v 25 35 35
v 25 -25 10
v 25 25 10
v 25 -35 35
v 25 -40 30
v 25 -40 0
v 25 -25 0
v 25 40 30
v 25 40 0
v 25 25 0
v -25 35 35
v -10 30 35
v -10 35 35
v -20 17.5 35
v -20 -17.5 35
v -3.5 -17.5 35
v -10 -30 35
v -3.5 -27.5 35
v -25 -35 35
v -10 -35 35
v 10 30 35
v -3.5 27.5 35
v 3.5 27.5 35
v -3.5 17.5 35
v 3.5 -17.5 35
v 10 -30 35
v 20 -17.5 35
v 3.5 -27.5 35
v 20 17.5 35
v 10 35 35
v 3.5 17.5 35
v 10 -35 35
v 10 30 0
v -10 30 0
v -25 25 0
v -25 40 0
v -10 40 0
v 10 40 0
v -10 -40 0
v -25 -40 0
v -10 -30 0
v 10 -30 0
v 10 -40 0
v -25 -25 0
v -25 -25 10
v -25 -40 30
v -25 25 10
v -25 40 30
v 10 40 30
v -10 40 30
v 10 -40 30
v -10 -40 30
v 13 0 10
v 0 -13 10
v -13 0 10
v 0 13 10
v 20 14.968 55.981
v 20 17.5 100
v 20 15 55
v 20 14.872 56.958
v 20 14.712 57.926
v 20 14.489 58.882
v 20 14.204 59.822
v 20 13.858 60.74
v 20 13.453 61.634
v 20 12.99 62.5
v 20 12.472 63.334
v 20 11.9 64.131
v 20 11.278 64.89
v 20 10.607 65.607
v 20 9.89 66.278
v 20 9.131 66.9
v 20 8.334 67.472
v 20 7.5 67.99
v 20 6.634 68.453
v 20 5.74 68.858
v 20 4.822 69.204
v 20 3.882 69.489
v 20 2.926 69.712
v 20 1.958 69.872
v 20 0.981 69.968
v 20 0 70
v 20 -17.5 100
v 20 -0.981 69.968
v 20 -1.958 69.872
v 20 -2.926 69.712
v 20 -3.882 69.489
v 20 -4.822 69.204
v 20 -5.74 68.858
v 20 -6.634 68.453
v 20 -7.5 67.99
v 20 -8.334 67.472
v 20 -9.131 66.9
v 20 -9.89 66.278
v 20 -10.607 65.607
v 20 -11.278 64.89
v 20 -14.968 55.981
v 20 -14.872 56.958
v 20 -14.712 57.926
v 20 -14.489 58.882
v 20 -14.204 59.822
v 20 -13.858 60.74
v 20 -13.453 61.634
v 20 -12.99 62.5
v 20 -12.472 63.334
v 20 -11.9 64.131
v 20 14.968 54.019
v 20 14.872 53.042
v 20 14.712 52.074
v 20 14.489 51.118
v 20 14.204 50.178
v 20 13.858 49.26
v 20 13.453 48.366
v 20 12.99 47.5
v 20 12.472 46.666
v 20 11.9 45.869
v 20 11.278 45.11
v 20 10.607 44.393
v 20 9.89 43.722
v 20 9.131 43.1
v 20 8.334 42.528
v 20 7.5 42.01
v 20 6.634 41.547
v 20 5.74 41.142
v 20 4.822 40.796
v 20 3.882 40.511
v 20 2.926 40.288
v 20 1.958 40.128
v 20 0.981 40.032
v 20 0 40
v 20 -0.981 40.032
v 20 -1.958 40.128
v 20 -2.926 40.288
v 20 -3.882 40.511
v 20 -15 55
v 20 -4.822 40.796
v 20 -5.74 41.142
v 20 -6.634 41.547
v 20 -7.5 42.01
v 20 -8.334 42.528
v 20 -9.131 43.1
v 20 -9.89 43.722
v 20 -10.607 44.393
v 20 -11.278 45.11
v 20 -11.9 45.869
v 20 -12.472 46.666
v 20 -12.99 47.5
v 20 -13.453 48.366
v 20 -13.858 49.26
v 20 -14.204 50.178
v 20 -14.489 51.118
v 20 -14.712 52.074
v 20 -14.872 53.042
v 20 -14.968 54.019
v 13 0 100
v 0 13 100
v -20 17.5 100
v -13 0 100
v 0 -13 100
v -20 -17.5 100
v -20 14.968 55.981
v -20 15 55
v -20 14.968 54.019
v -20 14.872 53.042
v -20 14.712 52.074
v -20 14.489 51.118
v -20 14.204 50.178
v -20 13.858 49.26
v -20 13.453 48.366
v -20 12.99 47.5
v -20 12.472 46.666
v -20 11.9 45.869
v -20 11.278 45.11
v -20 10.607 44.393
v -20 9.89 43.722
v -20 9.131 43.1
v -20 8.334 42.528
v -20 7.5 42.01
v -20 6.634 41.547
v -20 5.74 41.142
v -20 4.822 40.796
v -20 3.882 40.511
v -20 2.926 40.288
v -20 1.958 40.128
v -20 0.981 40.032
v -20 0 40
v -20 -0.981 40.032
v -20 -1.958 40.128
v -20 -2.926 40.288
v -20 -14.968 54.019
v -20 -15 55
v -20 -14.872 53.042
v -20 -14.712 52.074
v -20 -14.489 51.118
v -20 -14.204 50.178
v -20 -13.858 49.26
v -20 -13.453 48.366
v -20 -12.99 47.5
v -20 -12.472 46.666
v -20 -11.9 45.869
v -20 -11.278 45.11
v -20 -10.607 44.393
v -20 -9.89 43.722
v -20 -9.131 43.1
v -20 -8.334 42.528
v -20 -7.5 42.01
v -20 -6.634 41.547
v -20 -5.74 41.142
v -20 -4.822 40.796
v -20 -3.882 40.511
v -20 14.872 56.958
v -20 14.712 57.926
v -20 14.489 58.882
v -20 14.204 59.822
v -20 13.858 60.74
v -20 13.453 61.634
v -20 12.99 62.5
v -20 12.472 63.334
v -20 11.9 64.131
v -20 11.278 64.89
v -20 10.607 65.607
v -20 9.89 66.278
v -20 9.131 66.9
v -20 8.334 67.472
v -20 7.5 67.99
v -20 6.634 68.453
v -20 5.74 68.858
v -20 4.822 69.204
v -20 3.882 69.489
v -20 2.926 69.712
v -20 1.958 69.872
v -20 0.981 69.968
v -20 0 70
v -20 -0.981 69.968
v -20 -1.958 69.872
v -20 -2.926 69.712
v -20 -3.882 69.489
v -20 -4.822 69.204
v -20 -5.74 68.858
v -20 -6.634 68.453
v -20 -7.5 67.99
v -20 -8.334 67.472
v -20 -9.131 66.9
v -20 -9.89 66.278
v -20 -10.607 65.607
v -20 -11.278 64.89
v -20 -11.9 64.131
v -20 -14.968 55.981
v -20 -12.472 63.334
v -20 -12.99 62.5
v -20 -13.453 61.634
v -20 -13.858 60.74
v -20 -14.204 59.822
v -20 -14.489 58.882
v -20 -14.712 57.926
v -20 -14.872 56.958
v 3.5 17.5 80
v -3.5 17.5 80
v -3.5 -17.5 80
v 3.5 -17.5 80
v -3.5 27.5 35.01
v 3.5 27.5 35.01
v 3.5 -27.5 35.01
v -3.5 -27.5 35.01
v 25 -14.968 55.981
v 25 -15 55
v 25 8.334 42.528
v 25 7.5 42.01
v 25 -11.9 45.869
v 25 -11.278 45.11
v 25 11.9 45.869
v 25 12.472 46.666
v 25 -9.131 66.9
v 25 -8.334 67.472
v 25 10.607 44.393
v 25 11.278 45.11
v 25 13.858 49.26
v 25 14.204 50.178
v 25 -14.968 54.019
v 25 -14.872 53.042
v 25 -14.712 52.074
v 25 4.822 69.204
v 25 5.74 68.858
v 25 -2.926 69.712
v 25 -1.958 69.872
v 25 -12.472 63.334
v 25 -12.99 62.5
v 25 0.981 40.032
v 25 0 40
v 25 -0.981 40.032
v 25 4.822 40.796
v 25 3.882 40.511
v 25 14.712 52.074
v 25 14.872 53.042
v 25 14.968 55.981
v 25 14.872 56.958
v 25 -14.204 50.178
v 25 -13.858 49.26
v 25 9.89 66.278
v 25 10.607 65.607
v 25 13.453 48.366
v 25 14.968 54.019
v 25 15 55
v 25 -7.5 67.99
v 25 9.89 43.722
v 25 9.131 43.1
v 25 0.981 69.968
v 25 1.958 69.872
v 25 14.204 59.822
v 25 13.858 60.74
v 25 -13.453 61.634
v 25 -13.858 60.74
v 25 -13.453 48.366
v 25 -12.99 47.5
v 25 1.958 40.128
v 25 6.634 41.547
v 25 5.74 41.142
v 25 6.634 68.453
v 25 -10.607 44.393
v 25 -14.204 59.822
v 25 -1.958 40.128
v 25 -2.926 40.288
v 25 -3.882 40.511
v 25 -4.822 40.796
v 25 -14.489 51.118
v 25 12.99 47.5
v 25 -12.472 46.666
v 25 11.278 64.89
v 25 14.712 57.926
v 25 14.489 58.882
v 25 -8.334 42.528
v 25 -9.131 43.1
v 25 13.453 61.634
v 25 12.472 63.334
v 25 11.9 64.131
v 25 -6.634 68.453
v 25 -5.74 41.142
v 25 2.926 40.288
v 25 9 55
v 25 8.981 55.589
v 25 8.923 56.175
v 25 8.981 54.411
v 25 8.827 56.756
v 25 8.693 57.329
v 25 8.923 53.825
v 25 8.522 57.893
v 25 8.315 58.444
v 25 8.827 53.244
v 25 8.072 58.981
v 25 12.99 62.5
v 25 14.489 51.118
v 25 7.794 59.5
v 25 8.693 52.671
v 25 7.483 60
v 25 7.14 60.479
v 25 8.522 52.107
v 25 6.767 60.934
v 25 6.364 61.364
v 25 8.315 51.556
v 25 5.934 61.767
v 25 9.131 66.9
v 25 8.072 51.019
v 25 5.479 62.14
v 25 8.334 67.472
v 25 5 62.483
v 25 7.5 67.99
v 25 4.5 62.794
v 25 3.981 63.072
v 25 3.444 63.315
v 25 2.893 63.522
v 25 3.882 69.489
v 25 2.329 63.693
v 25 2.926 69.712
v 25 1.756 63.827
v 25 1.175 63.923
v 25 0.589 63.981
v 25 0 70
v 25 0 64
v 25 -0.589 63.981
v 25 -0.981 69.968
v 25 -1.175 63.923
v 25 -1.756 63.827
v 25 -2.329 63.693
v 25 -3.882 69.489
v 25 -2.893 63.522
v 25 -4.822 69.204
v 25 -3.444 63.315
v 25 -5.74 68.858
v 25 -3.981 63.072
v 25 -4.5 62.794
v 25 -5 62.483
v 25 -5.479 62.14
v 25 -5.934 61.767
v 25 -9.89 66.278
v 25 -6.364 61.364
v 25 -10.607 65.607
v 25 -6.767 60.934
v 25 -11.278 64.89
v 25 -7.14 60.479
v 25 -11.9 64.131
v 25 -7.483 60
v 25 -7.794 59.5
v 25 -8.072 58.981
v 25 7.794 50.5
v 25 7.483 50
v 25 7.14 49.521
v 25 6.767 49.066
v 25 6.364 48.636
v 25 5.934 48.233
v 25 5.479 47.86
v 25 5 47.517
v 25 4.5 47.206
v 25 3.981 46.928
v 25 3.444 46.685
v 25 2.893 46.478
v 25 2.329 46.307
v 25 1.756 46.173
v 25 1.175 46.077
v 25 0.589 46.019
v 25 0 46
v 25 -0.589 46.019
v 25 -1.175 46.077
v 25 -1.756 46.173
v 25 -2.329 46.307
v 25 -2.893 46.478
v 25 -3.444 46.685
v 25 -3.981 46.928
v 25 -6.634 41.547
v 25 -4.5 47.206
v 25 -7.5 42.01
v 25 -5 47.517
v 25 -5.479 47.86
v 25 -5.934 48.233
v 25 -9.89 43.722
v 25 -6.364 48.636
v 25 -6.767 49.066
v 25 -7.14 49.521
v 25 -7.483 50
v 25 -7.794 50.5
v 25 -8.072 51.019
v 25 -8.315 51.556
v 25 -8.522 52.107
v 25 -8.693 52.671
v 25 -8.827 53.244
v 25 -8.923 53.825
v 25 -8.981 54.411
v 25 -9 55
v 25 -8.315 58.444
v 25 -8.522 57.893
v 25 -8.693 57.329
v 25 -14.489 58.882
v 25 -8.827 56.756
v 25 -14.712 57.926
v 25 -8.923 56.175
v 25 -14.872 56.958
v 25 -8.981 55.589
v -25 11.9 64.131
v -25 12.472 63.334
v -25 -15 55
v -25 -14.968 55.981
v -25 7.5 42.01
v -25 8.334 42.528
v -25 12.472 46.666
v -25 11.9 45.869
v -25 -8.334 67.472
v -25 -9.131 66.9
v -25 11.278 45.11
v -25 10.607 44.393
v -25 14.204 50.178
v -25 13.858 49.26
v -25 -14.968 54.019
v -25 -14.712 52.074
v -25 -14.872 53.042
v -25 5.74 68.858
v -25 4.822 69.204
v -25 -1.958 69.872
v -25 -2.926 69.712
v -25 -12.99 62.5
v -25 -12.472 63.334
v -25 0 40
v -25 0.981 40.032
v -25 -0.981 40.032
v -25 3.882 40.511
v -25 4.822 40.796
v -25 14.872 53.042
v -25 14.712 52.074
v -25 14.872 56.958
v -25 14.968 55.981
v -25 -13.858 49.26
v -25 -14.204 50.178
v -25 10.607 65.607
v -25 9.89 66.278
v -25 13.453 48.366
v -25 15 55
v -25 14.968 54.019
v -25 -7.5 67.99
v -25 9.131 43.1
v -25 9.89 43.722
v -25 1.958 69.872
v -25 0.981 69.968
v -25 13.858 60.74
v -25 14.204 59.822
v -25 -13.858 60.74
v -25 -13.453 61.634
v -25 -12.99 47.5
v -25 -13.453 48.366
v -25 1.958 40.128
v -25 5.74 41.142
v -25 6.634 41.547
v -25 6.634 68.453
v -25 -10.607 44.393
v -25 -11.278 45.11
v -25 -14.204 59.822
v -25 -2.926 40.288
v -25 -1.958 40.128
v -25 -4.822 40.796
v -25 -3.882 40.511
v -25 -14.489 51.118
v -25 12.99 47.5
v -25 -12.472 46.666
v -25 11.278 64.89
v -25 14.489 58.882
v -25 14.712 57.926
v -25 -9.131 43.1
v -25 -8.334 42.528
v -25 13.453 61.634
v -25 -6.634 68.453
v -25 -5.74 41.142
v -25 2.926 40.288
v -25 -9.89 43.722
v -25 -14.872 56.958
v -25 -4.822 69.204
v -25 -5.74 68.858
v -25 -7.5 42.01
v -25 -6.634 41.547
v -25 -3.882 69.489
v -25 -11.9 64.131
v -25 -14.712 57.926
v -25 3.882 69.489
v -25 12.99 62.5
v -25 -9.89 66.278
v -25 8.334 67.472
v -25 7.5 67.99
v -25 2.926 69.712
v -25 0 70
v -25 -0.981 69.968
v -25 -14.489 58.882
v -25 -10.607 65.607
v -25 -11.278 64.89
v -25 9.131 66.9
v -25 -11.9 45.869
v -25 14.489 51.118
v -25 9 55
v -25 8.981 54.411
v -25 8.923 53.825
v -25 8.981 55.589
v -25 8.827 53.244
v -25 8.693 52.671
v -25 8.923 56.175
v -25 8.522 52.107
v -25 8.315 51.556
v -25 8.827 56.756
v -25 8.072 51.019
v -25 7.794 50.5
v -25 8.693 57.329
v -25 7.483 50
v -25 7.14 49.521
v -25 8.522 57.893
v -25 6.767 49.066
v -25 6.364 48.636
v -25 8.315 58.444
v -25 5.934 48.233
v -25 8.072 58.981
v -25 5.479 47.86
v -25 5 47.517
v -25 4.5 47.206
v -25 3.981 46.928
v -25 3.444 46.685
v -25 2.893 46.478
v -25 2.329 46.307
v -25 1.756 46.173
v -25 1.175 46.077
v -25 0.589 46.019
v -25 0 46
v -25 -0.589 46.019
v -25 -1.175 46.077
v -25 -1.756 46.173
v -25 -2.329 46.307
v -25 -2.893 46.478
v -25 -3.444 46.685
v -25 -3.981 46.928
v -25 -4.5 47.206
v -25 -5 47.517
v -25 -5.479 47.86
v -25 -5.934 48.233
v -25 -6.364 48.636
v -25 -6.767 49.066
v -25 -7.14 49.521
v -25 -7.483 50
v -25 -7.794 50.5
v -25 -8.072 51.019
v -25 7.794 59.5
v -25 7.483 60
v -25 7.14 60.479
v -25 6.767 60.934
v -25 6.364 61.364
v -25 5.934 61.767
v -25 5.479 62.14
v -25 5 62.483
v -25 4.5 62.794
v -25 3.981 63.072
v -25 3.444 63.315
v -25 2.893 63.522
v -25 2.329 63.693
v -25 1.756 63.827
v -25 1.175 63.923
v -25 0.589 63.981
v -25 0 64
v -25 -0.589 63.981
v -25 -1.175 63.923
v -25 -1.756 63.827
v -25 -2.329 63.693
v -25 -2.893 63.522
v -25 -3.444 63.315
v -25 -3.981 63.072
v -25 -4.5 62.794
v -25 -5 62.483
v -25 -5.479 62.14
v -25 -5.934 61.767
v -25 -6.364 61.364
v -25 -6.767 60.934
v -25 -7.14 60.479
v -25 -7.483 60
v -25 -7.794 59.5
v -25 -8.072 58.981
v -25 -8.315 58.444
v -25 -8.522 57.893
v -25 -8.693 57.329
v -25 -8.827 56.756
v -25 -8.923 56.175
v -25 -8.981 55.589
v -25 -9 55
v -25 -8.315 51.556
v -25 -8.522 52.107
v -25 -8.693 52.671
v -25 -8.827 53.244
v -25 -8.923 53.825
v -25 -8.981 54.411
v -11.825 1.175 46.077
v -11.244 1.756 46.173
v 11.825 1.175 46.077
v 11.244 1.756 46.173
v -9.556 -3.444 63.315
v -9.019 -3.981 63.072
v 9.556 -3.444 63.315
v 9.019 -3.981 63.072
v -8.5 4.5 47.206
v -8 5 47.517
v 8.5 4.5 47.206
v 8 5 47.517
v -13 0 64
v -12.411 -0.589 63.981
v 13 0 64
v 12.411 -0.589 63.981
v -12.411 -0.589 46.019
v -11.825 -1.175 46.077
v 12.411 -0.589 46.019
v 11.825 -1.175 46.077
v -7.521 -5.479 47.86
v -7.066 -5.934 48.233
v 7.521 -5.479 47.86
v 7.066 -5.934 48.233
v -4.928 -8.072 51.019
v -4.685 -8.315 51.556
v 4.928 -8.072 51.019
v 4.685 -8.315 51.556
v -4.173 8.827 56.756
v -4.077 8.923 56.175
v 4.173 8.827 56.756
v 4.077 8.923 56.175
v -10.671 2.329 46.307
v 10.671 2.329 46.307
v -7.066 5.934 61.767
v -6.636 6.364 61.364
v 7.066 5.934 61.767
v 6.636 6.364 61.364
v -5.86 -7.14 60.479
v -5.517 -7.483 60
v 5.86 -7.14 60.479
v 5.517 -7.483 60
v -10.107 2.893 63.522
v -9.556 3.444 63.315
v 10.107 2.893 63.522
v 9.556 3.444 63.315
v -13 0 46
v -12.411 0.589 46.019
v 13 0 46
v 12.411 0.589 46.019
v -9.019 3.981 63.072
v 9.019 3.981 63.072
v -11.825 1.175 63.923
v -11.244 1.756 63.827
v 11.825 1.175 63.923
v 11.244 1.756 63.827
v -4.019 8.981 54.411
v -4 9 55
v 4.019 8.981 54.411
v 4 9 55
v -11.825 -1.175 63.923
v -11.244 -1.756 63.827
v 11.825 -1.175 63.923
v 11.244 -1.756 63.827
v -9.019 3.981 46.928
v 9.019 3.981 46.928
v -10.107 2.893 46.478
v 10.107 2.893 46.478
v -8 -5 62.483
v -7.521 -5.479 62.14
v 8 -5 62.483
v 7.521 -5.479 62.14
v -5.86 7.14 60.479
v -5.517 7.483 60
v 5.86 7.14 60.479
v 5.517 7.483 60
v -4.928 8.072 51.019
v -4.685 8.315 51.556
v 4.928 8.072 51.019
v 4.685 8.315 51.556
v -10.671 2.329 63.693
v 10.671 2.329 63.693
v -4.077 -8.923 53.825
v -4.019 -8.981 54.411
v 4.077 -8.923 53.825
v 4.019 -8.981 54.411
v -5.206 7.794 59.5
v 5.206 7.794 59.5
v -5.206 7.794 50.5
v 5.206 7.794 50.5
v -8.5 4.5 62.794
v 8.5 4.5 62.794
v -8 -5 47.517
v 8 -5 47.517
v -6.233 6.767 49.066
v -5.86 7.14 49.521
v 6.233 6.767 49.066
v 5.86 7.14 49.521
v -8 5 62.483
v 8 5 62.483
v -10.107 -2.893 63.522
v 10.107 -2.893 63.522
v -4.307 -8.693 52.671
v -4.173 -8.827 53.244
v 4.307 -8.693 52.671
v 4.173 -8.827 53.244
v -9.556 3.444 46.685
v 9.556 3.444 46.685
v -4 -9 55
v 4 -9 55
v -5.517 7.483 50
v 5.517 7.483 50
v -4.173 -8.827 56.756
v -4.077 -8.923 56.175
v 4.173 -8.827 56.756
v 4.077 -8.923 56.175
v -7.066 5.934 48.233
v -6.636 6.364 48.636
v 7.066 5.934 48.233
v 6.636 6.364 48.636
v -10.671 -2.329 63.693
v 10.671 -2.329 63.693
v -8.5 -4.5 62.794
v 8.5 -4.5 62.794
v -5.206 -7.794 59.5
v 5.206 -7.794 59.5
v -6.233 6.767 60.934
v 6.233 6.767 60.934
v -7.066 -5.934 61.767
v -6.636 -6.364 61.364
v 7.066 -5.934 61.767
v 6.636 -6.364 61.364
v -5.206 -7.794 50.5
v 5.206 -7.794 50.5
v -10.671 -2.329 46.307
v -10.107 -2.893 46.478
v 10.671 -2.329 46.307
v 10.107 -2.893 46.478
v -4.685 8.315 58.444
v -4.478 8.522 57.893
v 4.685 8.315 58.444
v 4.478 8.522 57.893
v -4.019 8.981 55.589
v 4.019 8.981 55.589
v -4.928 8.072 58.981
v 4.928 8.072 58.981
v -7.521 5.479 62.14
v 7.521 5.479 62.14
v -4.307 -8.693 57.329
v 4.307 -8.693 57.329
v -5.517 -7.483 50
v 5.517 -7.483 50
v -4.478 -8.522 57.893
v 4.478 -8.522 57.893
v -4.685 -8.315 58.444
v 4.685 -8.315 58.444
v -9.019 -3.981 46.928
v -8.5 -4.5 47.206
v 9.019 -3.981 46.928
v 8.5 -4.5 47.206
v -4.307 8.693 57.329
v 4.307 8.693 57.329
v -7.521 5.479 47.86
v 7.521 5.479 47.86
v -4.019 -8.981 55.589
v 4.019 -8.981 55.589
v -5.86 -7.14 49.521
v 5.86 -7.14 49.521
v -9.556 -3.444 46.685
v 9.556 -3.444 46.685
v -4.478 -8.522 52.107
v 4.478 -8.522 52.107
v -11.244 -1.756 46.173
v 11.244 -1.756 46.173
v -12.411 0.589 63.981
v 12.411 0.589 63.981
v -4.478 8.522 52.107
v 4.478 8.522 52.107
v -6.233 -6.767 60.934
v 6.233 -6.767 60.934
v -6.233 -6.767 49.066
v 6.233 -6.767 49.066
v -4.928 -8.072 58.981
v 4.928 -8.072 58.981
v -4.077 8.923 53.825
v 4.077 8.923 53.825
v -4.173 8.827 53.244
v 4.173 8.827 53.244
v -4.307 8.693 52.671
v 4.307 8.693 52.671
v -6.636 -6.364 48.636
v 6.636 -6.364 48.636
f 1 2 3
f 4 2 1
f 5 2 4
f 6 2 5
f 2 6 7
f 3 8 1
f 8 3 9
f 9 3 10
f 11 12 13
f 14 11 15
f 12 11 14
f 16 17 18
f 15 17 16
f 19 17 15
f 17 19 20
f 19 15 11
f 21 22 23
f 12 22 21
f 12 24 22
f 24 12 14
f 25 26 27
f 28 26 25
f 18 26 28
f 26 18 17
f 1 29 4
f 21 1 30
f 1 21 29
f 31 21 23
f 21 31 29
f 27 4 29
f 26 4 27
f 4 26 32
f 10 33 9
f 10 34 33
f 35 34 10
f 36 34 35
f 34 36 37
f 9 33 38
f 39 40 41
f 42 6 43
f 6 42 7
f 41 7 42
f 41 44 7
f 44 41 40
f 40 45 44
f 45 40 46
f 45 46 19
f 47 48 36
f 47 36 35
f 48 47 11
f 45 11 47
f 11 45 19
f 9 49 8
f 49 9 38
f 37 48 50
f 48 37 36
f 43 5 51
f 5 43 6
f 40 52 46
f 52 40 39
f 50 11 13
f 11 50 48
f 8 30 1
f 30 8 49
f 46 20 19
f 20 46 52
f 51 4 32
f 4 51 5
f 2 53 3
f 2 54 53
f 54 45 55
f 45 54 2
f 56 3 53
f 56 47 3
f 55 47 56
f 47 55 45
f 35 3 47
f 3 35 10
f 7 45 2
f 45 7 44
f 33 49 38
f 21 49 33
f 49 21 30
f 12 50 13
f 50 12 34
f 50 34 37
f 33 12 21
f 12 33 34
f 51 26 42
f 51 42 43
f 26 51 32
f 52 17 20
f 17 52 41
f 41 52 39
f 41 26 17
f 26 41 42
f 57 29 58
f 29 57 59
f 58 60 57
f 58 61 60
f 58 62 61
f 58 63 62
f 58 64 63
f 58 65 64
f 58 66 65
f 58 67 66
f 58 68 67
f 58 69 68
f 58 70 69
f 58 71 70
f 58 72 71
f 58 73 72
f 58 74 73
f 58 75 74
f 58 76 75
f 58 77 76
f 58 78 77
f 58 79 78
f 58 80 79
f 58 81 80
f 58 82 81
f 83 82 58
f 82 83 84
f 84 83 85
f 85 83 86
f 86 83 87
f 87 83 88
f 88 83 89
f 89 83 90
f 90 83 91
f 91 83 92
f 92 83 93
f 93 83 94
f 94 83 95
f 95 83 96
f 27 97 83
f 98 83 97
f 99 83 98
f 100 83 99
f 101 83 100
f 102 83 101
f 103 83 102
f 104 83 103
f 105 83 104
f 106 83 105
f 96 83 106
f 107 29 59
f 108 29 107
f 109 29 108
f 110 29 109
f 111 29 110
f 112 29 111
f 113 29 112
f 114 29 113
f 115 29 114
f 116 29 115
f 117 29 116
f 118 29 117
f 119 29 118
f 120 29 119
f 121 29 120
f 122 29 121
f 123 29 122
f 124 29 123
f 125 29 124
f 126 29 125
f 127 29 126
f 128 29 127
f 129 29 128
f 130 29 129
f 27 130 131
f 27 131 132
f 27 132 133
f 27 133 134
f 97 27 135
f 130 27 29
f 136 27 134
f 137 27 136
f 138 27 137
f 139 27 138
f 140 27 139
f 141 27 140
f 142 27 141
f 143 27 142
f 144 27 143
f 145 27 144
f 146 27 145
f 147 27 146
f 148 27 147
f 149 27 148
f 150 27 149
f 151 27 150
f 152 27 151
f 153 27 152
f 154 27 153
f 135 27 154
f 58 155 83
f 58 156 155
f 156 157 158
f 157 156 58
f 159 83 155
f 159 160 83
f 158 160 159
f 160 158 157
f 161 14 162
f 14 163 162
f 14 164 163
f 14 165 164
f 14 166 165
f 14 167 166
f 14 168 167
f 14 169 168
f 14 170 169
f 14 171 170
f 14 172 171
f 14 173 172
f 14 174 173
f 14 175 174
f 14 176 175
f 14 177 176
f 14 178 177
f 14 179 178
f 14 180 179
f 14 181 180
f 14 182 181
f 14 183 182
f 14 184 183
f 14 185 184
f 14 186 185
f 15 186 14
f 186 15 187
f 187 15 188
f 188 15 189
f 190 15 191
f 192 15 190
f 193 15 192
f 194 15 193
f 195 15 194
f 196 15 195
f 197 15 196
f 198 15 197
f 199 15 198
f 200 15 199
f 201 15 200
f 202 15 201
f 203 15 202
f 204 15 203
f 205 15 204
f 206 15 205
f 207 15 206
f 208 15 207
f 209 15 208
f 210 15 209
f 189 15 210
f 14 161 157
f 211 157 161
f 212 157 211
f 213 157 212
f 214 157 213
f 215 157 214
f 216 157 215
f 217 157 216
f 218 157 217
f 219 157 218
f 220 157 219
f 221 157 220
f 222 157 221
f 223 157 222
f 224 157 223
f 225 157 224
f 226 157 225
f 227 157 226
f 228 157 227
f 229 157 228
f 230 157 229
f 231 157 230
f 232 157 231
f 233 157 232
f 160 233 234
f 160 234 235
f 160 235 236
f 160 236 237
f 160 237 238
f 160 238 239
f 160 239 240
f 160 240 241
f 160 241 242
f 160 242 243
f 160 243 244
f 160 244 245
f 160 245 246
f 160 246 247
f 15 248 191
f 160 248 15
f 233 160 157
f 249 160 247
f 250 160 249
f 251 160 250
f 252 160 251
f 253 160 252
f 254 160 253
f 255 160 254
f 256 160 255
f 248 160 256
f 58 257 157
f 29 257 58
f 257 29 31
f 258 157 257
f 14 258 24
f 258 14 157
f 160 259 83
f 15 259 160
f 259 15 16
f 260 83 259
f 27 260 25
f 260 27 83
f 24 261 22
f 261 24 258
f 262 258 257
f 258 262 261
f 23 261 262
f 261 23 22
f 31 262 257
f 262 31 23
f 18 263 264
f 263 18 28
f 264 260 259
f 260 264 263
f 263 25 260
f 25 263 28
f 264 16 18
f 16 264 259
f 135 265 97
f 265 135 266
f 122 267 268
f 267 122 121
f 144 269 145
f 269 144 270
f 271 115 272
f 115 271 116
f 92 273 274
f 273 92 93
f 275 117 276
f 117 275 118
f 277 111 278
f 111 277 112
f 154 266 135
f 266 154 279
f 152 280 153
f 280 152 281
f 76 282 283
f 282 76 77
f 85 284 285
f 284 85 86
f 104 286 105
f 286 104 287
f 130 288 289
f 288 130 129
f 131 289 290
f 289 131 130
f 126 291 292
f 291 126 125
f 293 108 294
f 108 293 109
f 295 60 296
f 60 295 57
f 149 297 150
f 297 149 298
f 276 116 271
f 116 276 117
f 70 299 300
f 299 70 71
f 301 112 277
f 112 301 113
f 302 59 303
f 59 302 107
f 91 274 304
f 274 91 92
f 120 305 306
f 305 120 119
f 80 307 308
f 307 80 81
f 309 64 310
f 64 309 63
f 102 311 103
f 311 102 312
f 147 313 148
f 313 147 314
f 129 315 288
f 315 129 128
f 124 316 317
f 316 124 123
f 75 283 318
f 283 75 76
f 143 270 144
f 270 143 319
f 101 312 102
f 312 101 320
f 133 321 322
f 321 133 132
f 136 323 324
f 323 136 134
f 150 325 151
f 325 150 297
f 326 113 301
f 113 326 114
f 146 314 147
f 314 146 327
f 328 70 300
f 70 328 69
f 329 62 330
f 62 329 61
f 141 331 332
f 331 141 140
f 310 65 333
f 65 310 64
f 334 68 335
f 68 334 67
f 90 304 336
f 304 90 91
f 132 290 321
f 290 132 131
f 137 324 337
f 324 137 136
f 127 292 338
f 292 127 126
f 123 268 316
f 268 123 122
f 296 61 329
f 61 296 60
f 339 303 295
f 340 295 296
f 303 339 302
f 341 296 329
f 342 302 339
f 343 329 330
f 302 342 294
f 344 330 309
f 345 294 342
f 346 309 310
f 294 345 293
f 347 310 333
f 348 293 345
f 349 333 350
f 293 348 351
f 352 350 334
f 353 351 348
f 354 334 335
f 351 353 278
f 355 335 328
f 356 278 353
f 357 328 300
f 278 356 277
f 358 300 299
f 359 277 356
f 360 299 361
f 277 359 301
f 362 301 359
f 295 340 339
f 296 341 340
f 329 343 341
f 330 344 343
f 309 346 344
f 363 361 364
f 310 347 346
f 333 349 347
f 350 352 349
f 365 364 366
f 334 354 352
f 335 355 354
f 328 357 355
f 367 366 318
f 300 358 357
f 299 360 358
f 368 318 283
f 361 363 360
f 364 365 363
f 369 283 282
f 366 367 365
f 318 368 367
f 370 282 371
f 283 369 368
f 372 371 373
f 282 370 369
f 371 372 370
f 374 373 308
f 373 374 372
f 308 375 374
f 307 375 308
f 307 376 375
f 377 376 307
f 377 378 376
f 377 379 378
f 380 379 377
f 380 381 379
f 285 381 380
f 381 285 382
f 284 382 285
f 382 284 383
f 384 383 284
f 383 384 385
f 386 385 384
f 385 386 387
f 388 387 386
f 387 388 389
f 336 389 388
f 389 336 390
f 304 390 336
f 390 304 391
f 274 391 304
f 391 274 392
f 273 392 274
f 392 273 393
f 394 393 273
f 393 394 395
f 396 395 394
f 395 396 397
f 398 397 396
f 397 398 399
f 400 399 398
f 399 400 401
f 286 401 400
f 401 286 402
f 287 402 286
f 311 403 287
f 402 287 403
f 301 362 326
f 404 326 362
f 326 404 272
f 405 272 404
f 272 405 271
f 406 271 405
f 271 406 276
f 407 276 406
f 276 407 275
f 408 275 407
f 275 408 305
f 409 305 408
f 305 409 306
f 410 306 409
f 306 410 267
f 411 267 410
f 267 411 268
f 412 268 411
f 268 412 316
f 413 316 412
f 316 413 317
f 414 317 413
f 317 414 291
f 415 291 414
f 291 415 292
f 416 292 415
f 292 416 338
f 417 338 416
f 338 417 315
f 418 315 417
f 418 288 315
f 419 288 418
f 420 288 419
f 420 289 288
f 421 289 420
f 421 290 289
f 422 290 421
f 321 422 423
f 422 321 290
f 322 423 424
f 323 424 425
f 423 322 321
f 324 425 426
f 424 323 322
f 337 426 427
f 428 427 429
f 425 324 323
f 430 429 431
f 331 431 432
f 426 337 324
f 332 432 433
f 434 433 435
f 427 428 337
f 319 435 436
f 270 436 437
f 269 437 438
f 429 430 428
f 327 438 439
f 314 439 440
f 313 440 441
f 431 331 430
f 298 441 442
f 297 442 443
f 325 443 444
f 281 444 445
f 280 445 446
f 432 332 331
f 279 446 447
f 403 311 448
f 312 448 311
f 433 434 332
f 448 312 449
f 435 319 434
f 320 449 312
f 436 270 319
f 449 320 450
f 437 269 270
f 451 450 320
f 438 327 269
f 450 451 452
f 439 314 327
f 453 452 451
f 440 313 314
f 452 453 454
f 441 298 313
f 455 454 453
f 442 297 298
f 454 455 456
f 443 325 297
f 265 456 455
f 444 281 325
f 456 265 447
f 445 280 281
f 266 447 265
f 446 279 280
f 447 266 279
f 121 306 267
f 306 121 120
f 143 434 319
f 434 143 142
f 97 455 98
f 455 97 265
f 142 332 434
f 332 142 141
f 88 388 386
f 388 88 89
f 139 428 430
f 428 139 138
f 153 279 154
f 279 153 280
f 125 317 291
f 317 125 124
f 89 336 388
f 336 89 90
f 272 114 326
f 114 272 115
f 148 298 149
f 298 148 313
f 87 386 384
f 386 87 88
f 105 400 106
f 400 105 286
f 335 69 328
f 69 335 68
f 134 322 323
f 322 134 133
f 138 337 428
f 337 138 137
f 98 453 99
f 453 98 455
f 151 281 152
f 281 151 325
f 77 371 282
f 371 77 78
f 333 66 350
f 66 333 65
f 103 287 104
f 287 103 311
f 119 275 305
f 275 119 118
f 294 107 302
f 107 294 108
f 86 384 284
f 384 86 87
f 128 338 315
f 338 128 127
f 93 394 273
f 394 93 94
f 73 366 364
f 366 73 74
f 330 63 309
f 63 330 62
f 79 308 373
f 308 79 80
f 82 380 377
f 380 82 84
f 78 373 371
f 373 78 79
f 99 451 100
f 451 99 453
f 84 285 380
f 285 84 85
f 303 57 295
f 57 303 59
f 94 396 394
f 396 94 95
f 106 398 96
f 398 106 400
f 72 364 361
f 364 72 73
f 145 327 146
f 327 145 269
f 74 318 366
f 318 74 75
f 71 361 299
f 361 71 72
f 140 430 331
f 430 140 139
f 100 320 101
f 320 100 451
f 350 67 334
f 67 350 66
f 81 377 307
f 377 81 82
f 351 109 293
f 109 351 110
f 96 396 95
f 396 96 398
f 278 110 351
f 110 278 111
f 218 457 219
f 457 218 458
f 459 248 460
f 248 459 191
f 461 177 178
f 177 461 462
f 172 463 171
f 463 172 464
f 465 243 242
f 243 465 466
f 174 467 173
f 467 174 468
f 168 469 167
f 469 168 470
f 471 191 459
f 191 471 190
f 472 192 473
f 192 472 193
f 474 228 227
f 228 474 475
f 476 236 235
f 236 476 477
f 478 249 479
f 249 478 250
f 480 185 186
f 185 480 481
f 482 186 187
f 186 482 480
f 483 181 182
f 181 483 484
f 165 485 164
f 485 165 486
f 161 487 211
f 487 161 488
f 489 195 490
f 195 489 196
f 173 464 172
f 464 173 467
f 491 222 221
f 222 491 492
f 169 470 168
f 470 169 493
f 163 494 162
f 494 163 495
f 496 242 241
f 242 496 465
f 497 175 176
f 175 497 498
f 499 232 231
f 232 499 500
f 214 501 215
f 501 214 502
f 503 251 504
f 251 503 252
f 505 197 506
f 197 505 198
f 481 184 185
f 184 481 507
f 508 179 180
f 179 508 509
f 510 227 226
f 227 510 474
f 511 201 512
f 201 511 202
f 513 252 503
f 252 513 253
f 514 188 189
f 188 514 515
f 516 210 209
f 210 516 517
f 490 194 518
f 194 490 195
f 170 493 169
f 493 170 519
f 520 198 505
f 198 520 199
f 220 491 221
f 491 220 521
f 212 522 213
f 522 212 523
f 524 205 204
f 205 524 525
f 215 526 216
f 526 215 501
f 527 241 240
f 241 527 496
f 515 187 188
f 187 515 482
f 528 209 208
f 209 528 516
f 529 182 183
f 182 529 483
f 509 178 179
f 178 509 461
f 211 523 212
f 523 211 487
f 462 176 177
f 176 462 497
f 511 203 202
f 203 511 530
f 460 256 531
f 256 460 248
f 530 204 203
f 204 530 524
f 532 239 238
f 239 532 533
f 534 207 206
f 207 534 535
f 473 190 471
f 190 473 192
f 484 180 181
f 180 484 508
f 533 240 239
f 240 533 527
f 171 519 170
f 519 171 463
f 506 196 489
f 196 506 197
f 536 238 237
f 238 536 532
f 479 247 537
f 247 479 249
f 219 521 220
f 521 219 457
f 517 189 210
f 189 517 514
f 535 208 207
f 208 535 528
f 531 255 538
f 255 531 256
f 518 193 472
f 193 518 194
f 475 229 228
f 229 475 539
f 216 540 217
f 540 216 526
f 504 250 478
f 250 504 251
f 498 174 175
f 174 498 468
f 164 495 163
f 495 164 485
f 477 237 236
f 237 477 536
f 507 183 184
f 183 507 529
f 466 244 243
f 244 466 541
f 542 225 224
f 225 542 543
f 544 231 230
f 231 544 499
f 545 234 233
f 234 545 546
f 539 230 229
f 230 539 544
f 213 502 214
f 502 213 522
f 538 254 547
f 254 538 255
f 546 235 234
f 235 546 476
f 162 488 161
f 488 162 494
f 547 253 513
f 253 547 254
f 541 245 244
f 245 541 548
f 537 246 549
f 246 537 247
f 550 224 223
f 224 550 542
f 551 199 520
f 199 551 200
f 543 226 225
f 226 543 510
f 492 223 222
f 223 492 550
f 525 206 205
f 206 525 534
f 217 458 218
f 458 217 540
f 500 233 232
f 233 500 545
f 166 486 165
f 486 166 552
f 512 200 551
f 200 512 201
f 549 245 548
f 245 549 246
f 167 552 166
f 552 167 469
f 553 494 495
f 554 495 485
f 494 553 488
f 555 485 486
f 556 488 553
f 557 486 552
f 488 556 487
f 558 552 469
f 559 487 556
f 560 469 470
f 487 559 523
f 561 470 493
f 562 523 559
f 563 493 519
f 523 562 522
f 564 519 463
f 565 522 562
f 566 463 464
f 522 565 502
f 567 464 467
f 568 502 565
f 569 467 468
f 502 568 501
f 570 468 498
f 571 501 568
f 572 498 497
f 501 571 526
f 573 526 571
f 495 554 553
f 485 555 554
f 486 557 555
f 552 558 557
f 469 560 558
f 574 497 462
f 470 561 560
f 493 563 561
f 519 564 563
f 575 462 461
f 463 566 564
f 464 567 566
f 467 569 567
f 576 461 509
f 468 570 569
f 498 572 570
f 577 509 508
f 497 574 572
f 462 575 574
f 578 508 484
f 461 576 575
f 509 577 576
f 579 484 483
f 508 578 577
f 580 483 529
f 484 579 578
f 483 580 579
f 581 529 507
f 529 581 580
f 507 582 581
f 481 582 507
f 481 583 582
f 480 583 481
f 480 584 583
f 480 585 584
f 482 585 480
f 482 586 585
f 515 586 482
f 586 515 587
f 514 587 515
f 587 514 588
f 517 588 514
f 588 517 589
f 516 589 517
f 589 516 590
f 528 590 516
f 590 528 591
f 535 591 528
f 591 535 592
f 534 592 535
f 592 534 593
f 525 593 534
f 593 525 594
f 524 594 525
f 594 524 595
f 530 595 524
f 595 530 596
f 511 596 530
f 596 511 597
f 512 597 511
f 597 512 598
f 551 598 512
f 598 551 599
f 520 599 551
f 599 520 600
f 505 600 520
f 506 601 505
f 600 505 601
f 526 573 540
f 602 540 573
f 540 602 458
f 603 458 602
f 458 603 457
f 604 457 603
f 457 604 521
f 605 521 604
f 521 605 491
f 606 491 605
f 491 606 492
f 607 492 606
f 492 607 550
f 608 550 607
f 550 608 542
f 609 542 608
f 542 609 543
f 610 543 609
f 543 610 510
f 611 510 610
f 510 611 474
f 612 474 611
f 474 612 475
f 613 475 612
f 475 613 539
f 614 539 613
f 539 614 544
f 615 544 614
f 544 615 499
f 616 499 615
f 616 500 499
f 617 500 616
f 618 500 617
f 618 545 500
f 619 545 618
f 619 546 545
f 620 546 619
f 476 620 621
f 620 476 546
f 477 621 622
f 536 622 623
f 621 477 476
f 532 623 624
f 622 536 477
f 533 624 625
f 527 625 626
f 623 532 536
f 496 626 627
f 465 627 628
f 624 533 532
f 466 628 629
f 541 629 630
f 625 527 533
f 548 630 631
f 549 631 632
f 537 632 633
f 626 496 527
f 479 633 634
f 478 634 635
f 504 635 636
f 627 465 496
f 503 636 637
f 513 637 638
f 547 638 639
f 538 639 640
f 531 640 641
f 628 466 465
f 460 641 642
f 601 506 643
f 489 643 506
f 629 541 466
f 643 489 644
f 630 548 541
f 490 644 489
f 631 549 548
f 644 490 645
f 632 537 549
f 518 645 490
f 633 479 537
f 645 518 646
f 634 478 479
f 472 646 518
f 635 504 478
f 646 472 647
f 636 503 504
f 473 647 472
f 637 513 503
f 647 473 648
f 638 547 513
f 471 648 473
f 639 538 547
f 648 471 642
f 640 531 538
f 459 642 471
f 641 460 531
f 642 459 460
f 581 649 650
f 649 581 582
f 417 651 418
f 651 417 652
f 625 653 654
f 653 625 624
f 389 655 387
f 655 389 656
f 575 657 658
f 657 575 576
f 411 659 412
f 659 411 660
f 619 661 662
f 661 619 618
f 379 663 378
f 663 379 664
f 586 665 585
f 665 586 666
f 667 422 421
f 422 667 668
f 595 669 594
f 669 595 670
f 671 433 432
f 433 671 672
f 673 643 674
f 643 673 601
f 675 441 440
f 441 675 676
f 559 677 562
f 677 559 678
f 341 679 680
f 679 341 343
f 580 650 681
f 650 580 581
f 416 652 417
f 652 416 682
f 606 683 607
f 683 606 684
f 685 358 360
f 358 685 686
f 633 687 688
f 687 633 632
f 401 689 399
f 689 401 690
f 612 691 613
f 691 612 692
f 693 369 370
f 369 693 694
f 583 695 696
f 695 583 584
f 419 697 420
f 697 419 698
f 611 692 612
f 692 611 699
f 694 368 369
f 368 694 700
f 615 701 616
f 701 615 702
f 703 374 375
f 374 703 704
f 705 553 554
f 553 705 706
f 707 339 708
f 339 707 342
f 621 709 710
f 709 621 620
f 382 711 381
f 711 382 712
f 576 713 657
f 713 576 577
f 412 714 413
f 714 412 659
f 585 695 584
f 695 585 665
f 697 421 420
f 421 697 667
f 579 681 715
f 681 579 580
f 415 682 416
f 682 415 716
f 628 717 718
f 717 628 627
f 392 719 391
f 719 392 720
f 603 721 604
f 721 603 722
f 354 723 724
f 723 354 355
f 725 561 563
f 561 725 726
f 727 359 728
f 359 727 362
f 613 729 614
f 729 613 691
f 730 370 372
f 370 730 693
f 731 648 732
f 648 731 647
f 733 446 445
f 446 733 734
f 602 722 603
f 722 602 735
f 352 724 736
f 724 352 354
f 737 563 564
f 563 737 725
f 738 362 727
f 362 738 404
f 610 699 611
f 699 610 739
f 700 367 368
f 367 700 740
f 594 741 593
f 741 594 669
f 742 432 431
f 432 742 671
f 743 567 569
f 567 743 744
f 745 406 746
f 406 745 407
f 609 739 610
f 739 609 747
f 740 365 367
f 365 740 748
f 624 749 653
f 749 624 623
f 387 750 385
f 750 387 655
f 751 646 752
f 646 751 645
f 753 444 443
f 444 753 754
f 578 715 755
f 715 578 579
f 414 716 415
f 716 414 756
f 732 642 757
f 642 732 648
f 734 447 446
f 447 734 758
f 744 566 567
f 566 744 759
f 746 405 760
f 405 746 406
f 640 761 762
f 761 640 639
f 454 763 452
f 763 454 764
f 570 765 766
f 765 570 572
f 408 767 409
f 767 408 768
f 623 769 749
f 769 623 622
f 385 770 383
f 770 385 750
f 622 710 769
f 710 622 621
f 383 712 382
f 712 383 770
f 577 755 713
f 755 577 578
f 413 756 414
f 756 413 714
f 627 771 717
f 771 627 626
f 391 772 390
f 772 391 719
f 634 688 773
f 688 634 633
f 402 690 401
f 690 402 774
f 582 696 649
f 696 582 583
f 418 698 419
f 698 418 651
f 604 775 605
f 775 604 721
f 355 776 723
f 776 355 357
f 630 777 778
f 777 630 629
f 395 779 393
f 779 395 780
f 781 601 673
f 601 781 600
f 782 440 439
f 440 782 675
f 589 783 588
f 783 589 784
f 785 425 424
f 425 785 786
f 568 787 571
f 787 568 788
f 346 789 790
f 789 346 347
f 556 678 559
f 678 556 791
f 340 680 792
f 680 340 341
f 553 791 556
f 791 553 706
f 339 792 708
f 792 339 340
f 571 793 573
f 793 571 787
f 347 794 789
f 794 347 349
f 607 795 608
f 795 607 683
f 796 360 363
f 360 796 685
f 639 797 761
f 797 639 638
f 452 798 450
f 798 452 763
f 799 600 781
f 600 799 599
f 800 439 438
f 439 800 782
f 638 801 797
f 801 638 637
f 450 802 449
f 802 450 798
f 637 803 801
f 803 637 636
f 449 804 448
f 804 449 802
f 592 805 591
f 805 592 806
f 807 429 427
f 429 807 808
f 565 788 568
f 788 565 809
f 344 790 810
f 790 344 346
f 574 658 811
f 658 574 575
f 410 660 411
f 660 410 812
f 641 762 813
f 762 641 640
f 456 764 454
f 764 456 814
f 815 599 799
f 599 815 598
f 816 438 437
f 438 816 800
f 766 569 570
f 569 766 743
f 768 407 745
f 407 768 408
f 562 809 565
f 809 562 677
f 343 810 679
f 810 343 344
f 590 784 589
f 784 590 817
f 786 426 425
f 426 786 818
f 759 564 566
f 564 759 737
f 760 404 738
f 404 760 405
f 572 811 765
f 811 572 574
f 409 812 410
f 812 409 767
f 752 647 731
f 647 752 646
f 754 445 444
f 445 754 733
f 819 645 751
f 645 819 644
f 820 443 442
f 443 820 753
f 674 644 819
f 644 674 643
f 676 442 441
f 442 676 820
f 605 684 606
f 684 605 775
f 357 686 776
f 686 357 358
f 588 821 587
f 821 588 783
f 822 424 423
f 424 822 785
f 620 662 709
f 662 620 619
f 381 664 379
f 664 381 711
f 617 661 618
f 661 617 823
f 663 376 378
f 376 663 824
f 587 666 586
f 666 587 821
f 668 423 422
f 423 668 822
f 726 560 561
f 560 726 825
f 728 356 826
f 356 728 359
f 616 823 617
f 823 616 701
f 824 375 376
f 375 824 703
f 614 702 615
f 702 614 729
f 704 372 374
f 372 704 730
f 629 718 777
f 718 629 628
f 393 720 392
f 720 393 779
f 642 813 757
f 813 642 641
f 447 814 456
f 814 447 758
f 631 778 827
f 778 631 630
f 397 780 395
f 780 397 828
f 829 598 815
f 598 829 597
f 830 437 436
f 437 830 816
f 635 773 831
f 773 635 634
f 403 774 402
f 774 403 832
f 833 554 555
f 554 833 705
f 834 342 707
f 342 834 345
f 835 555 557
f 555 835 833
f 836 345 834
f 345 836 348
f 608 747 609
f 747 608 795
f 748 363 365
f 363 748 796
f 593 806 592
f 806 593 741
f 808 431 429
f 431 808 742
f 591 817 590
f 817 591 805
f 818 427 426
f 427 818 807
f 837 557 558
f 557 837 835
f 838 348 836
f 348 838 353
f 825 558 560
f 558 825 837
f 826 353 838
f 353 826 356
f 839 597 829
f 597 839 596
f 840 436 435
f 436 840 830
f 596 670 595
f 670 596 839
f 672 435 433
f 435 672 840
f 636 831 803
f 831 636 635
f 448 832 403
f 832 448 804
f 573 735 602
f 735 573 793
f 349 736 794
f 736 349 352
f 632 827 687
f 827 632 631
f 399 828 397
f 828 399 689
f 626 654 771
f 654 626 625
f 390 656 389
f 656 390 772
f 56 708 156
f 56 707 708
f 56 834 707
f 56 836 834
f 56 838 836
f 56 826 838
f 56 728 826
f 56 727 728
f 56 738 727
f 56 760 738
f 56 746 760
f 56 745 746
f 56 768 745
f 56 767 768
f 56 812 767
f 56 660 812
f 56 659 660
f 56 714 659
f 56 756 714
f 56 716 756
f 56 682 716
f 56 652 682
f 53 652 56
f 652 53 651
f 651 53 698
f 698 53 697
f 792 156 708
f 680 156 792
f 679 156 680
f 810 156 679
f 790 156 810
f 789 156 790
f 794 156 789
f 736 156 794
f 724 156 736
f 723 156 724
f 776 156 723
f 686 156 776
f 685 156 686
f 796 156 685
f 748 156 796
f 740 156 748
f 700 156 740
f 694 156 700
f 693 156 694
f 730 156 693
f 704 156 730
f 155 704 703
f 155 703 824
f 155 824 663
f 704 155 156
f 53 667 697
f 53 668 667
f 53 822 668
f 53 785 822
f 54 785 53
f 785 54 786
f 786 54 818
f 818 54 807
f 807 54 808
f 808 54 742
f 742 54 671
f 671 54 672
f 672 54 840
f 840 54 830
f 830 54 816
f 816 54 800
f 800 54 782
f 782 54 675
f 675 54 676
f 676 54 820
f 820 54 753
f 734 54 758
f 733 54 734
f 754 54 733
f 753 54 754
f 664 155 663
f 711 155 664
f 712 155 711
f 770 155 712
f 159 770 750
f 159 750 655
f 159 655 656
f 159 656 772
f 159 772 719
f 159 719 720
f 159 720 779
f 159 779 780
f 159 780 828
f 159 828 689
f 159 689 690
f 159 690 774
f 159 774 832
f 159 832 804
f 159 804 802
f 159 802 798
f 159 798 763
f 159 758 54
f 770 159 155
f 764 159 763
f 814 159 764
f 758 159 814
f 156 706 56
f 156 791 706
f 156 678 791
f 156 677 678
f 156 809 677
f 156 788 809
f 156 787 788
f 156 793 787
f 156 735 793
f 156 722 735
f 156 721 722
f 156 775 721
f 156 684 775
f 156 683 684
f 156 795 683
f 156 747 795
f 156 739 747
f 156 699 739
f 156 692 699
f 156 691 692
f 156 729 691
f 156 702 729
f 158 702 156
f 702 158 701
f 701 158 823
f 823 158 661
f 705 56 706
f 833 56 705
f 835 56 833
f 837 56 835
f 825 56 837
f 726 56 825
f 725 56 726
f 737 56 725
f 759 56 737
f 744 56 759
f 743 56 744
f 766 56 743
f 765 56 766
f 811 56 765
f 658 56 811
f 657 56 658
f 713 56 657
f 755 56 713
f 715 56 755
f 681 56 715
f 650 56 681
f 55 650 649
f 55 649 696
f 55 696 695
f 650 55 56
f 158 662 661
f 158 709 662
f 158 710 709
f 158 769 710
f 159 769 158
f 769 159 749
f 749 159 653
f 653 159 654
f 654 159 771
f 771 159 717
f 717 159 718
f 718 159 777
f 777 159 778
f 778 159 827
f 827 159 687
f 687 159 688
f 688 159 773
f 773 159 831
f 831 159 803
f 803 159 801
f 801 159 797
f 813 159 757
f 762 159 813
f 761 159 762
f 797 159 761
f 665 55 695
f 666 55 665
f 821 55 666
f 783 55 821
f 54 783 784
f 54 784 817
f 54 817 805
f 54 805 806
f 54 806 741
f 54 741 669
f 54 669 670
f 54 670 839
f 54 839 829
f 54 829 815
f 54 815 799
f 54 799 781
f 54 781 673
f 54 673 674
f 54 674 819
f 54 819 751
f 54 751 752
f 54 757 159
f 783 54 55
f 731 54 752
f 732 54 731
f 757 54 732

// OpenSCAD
$fn = 96;

eps = 0.01;
cut_eps = 2;

body_x = 40;
body_y = 35;
body_z = 65;

hole_rect_x = 26;
hole_rect_y = 26;

hole_rect_shift_x = 0;
hole_rect_shift_y = 0;
hole_rect_bbox = 26;
hole_rect_side = hole_rect_bbox / sqrt(2);

rib_width_x  = 7;
rib_depth_y  = 10;
rib_height_z = 45;
rib_shift_x  = 0;

boss_d = 30;
boss_len = 5;
boss_center_y = 0;
boss_center_z = 20;

cross_hole_d = 18;
cross_hole_y = boss_center_y;
cross_hole_z = boss_center_z;

lower_x = 50;
lower_y = 80;
lower_z = 35;

upper_shift_x = 0;
upper_shift_y = 0;

lower_chamfer_y = 5;
lower_chamfer_z = 5;

bottom_slot_y = 50;
bottom_slot_z = 10;
bottom_slot_shift_y = 0;


side_notch_x = 20;
side_notch_depth_y = 10;
side_notch_z = lower_z + 1;
side_notch_bottom_z = -0.5;
side_notch_shift_x = 0;


module main_body() {
    translate([-body_x/2, -body_y/2, 0])
        cube([body_x, body_y, body_z]);
}


module vertical_rect_hole() {
    translate([
        upper_shift_x + hole_rect_shift_x,
        upper_shift_y + hole_rect_shift_y,
        -cut_eps
    ])
        linear_extrude(
            height = lower_z + body_z + 2*cut_eps,
            convexity = 10
        )
            rotate(45)
                square([hole_rect_side, hole_rect_side], center = true);
}


module rib_y(side = 1) {
    hull() {
        translate([
            rib_shift_x - rib_width_x/2,
            (side > 0) ? body_y/2 : -body_y/2 - rib_depth_y,
            0
        ])
            cube([rib_width_x, rib_depth_y, eps]);

        translate([
            rib_shift_x - rib_width_x/2,
            (side > 0) ? body_y/2 - eps : -body_y/2,
            rib_height_z - eps
        ])
            cube([rib_width_x, eps, eps]);
    }
}


module side_boss(side = 1) {
    translate([
        side * (body_x/2 + boss_len/2),
        boss_center_y,
        boss_center_z
    ])
        rotate([0, 90, 0])
            cylinder(h = boss_len, d = boss_d, center = true);
}


module horizontal_cross_hole() {
    total_len = body_x + 2*boss_len + 2*eps;

    translate([0, cross_hole_y, cross_hole_z])
        rotate([0, 90, 0])
            cylinder(h = total_len, d = cross_hole_d, center = true);
}


module upper_part() {
    difference() {
        union() {
            main_body();

            rib_y( 1);
            rib_y(-1);

            side_boss( 1);
            side_boss(-1);
        }

        horizontal_cross_hole();
    }
}


module lower_body() {
    translate([-lower_x/2, -lower_y/2, 0])
        cube([lower_x, lower_y, lower_z]);
}


module prism_along_x(points_yz, x_len) {
    multmatrix([
        [0, 0, 1, 0],
        [1, 0, 0, 0],
        [0, 1, 0, 0],
        [0, 0, 0, 1]
    ])
        linear_extrude(height = x_len, center = true, convexity = 10)
            polygon(points = points_yz);
}

module top_chamfer_along_x(side = 1) {

    y_inner = side * (lower_y/2 - lower_chamfer_y);
    y_edge  = side * (lower_y/2);
    y_outer = side * (lower_y/2 + cut_eps);

    z_top   = lower_z;
    z_edge  = lower_z - lower_chamfer_z;

    pts = [
        [y_inner, z_top],
        [y_outer, z_top + cut_eps],
        [y_outer, z_edge - cut_eps],
        [y_edge,  z_edge]
    ];

    prism_along_x(pts, lower_x + 2*cut_eps);
}

module bottom_slot_along_x() {
    translate([
        -(lower_x + 2*eps)/2,
        bottom_slot_shift_y - bottom_slot_y/2,
        -eps
    ])
        cube([
            lower_x + 2*eps,
            bottom_slot_y,
            bottom_slot_z + eps
        ]);
}


module side_notch_from_y(side = 1) {
    y0 = (side > 0)
        ? lower_y/2 - side_notch_depth_y
        : -lower_y/2 - eps;

    translate([
        side_notch_shift_x - side_notch_x/2,
        y0,
        side_notch_bottom_z
    ])
        cube([
            side_notch_x,
            side_notch_depth_y + eps,
            side_notch_z
        ]);
}


module lower_part() {
    difference() {
        lower_body();

        top_chamfer_along_x( 1);
        top_chamfer_along_x(-1);

        bottom_slot_along_x();

        side_notch_from_y( 1);
        side_notch_from_y(-1);
    }
}


difference() {
    union() {
        lower_part();

        translate([upper_shift_x, upper_shift_y, lower_z])
            upper_part();
    }

    vertical_rect_hole();
}
